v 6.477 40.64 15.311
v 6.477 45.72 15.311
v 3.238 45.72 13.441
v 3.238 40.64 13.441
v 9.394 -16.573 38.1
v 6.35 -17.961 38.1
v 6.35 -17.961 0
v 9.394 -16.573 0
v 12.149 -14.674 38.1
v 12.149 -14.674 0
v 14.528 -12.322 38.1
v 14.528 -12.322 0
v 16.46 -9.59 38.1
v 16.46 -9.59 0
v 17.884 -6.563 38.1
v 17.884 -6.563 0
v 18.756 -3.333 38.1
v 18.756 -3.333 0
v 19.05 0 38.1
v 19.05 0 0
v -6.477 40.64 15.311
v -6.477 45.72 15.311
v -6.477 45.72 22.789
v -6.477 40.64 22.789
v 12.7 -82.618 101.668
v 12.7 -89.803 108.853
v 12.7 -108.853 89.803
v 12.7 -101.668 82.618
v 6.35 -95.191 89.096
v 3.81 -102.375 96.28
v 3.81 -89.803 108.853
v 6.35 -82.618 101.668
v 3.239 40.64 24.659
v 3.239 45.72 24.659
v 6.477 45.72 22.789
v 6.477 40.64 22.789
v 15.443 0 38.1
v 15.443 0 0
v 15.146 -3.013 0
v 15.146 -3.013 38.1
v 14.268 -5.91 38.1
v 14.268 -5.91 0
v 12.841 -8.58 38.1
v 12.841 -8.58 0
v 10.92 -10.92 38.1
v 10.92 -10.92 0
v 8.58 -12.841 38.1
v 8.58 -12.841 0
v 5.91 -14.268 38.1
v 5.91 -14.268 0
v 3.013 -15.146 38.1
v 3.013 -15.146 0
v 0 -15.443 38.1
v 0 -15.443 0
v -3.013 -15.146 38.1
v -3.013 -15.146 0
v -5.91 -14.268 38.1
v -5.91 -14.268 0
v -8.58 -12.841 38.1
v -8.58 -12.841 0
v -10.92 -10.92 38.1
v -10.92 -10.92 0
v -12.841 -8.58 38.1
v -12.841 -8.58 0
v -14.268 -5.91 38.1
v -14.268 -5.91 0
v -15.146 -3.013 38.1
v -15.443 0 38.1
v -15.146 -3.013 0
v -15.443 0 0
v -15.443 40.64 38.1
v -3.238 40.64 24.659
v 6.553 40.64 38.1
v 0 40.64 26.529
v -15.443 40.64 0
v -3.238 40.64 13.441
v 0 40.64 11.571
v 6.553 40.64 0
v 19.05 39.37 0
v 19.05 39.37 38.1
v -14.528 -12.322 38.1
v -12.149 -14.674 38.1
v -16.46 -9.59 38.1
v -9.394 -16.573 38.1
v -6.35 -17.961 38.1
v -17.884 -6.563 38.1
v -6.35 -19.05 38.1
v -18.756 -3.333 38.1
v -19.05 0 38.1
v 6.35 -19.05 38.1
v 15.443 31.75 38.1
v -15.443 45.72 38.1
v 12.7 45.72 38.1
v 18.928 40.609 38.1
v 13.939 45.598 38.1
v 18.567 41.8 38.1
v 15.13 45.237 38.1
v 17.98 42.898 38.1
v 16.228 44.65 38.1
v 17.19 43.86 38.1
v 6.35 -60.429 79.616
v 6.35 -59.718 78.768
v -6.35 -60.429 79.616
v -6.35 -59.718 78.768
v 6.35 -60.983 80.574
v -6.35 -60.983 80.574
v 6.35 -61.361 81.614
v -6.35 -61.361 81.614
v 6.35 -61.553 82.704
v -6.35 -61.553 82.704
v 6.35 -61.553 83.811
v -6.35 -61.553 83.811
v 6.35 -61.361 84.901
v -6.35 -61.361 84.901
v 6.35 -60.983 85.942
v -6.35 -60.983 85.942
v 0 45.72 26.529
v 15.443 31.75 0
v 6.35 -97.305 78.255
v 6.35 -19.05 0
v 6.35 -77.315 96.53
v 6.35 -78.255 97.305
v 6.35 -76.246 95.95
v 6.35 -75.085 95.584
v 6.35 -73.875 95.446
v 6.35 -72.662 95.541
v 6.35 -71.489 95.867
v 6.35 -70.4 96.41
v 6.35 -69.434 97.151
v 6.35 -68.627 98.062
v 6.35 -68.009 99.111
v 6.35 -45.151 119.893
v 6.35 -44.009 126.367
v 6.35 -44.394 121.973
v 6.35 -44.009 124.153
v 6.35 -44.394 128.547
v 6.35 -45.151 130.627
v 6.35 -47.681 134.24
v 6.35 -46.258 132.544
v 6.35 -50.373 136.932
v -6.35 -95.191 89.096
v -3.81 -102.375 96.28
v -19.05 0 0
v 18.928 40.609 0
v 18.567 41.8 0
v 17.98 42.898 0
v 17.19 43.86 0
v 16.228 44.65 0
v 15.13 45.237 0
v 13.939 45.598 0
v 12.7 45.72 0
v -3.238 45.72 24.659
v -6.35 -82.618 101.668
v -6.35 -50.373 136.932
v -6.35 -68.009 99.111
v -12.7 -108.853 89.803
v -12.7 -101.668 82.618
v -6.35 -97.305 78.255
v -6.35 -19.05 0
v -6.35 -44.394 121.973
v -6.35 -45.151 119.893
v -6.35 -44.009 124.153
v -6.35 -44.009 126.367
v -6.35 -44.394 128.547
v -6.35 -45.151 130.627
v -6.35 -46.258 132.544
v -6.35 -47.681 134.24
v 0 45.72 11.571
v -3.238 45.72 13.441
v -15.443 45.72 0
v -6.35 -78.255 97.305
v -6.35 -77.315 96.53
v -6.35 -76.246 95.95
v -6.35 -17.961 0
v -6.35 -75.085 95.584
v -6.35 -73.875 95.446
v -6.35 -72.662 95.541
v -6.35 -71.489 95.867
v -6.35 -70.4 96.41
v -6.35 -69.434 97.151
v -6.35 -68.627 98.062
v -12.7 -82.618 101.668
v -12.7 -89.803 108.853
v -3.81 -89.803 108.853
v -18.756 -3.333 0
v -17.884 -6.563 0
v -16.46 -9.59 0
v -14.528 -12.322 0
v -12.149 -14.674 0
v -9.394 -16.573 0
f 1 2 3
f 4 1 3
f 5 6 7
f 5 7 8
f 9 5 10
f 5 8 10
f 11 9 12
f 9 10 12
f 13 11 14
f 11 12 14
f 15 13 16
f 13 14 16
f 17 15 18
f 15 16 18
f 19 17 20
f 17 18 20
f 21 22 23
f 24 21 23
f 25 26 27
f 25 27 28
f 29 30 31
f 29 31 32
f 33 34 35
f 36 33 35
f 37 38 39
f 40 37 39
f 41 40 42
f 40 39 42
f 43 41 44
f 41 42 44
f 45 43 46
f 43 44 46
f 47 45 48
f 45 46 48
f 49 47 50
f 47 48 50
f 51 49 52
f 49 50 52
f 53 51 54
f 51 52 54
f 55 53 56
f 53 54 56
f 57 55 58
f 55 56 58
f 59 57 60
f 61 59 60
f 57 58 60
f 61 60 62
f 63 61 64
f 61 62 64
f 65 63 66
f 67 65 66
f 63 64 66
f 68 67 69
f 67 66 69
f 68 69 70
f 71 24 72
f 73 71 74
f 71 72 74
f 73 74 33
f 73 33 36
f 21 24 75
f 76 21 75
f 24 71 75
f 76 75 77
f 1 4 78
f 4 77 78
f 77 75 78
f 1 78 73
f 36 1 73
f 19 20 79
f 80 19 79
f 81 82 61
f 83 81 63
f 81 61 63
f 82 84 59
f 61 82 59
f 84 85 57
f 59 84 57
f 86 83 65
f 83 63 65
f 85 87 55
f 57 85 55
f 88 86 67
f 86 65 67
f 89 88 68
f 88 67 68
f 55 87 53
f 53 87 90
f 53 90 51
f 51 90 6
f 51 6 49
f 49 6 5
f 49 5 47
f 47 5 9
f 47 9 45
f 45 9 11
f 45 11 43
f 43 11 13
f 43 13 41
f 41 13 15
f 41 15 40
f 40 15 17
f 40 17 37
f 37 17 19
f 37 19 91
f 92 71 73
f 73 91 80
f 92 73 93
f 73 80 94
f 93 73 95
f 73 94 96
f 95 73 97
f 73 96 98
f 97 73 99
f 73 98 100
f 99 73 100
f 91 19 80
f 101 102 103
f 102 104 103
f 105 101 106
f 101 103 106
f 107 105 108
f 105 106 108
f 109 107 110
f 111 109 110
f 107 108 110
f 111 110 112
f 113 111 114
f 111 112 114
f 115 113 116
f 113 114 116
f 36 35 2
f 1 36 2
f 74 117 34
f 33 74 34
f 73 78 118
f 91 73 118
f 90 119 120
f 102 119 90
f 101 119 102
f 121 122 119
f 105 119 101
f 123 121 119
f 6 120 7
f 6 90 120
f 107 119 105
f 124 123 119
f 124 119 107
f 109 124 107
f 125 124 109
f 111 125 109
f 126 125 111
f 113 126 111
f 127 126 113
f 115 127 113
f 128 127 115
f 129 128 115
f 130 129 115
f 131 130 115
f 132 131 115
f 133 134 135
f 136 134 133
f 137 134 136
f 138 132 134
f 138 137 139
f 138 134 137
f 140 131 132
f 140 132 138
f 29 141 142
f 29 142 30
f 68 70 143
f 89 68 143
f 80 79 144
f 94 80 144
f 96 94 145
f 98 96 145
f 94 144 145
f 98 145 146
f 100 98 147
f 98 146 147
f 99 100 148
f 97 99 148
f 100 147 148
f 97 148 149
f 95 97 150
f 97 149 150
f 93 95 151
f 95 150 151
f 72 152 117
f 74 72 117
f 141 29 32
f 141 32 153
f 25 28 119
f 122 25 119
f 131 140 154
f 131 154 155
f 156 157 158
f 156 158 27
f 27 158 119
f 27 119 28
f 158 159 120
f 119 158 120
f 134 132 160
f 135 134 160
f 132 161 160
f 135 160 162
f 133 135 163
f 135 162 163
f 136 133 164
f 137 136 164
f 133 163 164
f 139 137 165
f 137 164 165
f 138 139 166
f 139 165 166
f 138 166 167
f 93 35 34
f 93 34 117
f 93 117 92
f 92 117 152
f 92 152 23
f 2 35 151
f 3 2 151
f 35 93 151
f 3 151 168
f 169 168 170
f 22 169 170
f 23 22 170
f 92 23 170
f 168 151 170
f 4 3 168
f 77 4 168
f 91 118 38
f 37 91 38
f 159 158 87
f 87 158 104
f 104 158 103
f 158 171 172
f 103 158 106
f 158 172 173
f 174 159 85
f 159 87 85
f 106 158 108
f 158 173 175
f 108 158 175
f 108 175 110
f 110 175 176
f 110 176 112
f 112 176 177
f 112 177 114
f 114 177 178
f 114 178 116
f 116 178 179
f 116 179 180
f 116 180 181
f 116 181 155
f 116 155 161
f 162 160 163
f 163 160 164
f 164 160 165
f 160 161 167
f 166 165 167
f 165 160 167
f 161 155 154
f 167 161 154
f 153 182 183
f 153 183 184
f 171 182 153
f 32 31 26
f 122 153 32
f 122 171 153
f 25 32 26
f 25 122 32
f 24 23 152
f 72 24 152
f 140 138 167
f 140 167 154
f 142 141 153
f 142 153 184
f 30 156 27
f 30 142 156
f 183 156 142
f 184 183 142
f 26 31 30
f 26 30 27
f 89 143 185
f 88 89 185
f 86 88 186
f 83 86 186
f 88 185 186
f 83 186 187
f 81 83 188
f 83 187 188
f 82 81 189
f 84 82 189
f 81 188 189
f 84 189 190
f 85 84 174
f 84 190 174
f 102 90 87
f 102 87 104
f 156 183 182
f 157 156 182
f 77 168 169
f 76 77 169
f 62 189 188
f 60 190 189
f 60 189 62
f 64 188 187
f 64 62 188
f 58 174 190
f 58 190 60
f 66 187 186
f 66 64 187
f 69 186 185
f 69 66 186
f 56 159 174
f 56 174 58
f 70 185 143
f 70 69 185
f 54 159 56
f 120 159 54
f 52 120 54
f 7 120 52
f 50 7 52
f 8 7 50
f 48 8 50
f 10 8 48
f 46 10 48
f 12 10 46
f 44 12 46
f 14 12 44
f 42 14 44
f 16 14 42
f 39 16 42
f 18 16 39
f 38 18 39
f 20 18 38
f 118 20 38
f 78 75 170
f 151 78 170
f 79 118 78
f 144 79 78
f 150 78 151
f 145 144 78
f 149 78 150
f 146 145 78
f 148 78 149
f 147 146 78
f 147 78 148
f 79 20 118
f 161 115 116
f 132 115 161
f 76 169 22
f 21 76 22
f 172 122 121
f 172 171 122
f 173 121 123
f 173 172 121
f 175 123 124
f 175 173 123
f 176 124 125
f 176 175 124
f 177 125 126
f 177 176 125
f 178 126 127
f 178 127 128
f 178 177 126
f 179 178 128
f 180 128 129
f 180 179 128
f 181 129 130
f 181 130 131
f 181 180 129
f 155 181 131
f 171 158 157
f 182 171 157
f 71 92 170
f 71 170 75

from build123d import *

# Parameters (mm, degrees)
F1_DEPTH  = 38.1
F2_W      = 3.6068
F2_H      = 38.1
F3_DEPTH  = 6.35
F5_DEPTH  = 12.7
F6_R      = 6.35
F7_R      = 12.7
F8_W      = 6.35
F8_H      = 10.16
F9_DEPTH  = 26.9407683632
F11_DEPTH = 17.78
F13_DEPTH = 25.4


# Not quite as in the source:
# - a feature names something its author has since deleted; it is built from what else it names


with BuildPart() as f1:
    # F0 (on Top) → F1 (new body)
    with BuildSketch(Plane.XY):
        with BuildLine():
            ThreePointArc((15.4432, 0), (0, -15.4432), (-15.4432, 0))
            Line((-15.4432, 0), (-19.05, 0))
            ThreePointArc((-19.05, 0), (0, -19.05), (19.05, 0))
            Line((19.05, 0), (19.05, 39.37))
            ThreePointArc((19.05, 39.37), (17.1901280605, 43.8601280605), (12.7, 45.72))
            Line((12.7, 45.72), (-15.4432, 45.72))
            Line((-15.4432, 45.72), (-15.4432, 40.64))
            Line((-15.4432, 40.64), (6.5532, 40.64))
            Line((6.5532, 40.64), (9.0932, 40.64))
            Line((9.0932, 40.64), (15.4432, 40.64))
            Line((15.4432, 40.64), (15.4432, 34.29))
            Line((15.4432, 34.29), (15.4432, 31.75))
            Line((15.4432, 31.75), (15.4432, 0))
        make_face()
        with BuildLine():
            Line((6.5532, 40.64), (15.4432, 31.75))
            Line((15.4432, 31.75), (15.4432, 34.29))
            ThreePointArc((15.4432, 34.29), (13.5833280605, 38.7801280605), (9.0932, 40.64))
            Line((9.0932, 40.64), (6.5532, 40.64))
        make_face()
        with BuildLine():
            ThreePointArc((9.0932, 40.64), (13.5833280605, 38.7801280605), (15.4432, 34.29))
            Line((15.4432, 34.29), (15.4432, 40.64))
            Line((15.4432, 40.64), (9.0932, 40.64))
        make_face()
    extrude(amount=F1_DEPTH)

    # F2 (on Right) → F3 (join, symmetric)
    with BuildSketch(Plane.YZ):
        Polygon((-108.8525612107, 89.8025612107), (-19.05, 0), (-19.05, 38.1), (-89.8025612107, 108.8525612107), align=None)
        with Locations((-17.2466, 19.05)):
            Rectangle(F2_W, F2_H)
    extrude(amount=F3_DEPTH, both=True)

    # F4 (on face) → F5 (join, through all)
    with BuildSketch(Plane.YZ.offset(6.35)):
        Polygon((-50.3730412721, 136.93248455), (-71.8420489686, 90.8920489686), (-62.8617928475, 81.9117928475), (-41.3927851511, 127.9522284289), align=None)
    extrude(amount=-F5_DEPTH)

    # F6
    f6_edges = [f1.edges().sort_by_distance(p)[0] for p in [
        (0, -71.842049, 90.892049),
        (0, -62.861793, 81.911793),
    ]]
    fillet(f6_edges, radius=F6_R)

    # F7
    f7_edges = [f1.edges().sort_by_distance(p)[0] for p in [
        (0, -41.392785, 127.952228),
    ]]
    fillet(f7_edges, radius=F7_R)

    # F8 (on face) → F9 (join, through all)
    with BuildSketch(Plane(origin=(0, 9.525, 9.525), x_dir=(1, 0, 0), z_dir=(0, 0.7071067812, 0.7071067812))):
        with Locations((-9.525, -135.3903841816)):
            Rectangle(F8_W, F8_H)
        with Locations((9.525, -135.3903841816)):
            Rectangle(F8_W, F8_H)
        Polygon((-12.7, -130.3103841816), (-6.35, -130.3103841816), (-6.35, -124.1391240244), align=None)
        Polygon((6.35, -124.1391240244), (6.35, -130.3103841816), (12.7, -130.3103841816), align=None)
    extrude(amount=-F9_DEPTH)

    # F10 (on face) → F11 (cut)
    with BuildSketch(Plane(origin=(0, 9.525, 9.525), x_dir=(1, 0, 0), z_dir=(0, 0.7071067812, 0.7071067812))):
        Polygon((-6.35, -130.3103841816), (-3.81, -140.4703841816), (0, -140.4703841816), (0, -130.3103841816), align=None)
        Polygon((0, -130.3103841816), (0, -140.4703841816), (3.81, -140.4703841816), (6.35, -130.3103841816), align=None)
    extrude(amount=-F11_DEPTH, mode=Mode.SUBTRACT)

    # F12 (on face) → F13 (cut)
    with BuildSketch(Plane(origin=(0, 45.72, 0), x_dir=(-1, 0, 0), z_dir=(0, 1, 0))):
        with BuildLine():
            Line((-6.477, 15.3105023065), (-3.2384999613, 13.4407534373))
            ThreePointArc((-3.2384999613, 13.4407534373), (-5.6092465291, 15.8114999806), (-6.477, 19.05))
            Line((-6.477, 19.05), (-6.477, 15.3105023065))
        make_face()
        with BuildLine():
            Line((-3.2384999613, 13.4407534373), (0, 11.5710046129))
            Line((0, 11.5710046129), (0, 12.573))
            ThreePointArc((0, 12.573), (-1.6763709335, 12.7936984173), (-3.2384999613, 13.4407534373))
        make_face()
        with BuildLine():
            Line((0, 12.573), (0, 11.5710046129))
            Line((0, 11.5710046129), (3.2384995854, 13.4407532203))
            ThreePointArc((3.2384995854, 13.4407532203), (1.6763707239, 12.7936983612), (0, 12.573))
        make_face()
        with BuildLine():
            ThreePointArc((6.477, 19.05), (5.6092464206, 15.8114997927), (3.2384995854, 13.4407532203))
            Line((3.2384995854, 13.4407532203), (6.477, 15.3105023065))
            Line((6.477, 15.3105023065), (6.477, 19.05))
        make_face()
        with BuildLine():
            ThreePointArc((3.2384999681, 24.6592465587), (5.6092465311, 22.288500016), (6.477, 19.05))
            Line((6.477, 19.05), (6.477, 22.7894976935))
            Line((6.477, 22.7894976935), (3.2384999681, 24.6592465587))
        make_face()
        with BuildLine():
            Line((-6.477, 22.7894976935), (-6.477, 19.05))
            ThreePointArc((-6.477, 19.05), (-5.6092466761, 22.2884997648), (-3.2385004704, 24.6592462687))
            Line((-3.2385004704, 24.6592462687), (-6.477, 22.7894976935))
        make_face()
        with BuildLine():
            ThreePointArc((-3.2385004704, 24.6592462687), (-1.6763712174, 25.3063015066), (0, 25.527))
            Line((0, 25.527), (0, 26.5289953871))
            Line((0, 26.5289953871), (-3.2385004704, 24.6592462687))
        make_face()
        with BuildLine():
            ThreePointArc((0, 25.527), (1.6763709373, 25.3063015816), (3.2384999681, 24.6592465587))
            Line((3.2384999681, 24.6592465587), (0, 26.5289953871))
            Line((0, 26.5289953871), (0, 25.527))
        make_face()
        with BuildLine():
            Line((0, 19.05), (6.477, 19.05))
            ThreePointArc((6.477, 19.05), (5.6092465311, 22.288500016), (3.2384999681, 24.6592465587))
            ThreePointArc((3.2384999681, 24.6592465587), (1.6763709373, 25.3063015816), (0, 25.527))
            Line((0, 25.527), (0, 19.05))
        make_face()
        with BuildLine():
            Line((-6.477, 19.05), (0, 19.05))
            Line((0, 19.05), (0, 25.527))
            ThreePointArc((0, 25.527), (-1.6763712174, 25.3063015066), (-3.2385004704, 24.6592462687))
            ThreePointArc((-3.2385004704, 24.6592462687), (-5.6092466761, 22.2884997648), (-6.477, 19.05))
        make_face()
        with BuildLine():
            ThreePointArc((-3.2384999613, 13.4407534373), (-1.6763709335, 12.7936984173), (0, 12.573))
            Line((0, 12.573), (0, 19.05))
            Line((0, 19.05), (-6.477, 19.05))
            ThreePointArc((-6.477, 19.05), (-5.6092465291, 15.8114999806), (-3.2384999613, 13.4407534373))
        make_face()
        with BuildLine():
            Line((0, 19.05), (0, 12.573))
            ThreePointArc((0, 12.573), (1.6763707239, 12.7936983612), (3.2384995854, 13.4407532203))
            ThreePointArc((3.2384995854, 13.4407532203), (5.6092464206, 15.8114997927), (6.477, 19.05))
            Line((6.477, 19.05), (0, 19.05))
        make_face()
    extrude(amount=-F13_DEPTH, mode=Mode.SUBTRACT)


solid = f1.part
